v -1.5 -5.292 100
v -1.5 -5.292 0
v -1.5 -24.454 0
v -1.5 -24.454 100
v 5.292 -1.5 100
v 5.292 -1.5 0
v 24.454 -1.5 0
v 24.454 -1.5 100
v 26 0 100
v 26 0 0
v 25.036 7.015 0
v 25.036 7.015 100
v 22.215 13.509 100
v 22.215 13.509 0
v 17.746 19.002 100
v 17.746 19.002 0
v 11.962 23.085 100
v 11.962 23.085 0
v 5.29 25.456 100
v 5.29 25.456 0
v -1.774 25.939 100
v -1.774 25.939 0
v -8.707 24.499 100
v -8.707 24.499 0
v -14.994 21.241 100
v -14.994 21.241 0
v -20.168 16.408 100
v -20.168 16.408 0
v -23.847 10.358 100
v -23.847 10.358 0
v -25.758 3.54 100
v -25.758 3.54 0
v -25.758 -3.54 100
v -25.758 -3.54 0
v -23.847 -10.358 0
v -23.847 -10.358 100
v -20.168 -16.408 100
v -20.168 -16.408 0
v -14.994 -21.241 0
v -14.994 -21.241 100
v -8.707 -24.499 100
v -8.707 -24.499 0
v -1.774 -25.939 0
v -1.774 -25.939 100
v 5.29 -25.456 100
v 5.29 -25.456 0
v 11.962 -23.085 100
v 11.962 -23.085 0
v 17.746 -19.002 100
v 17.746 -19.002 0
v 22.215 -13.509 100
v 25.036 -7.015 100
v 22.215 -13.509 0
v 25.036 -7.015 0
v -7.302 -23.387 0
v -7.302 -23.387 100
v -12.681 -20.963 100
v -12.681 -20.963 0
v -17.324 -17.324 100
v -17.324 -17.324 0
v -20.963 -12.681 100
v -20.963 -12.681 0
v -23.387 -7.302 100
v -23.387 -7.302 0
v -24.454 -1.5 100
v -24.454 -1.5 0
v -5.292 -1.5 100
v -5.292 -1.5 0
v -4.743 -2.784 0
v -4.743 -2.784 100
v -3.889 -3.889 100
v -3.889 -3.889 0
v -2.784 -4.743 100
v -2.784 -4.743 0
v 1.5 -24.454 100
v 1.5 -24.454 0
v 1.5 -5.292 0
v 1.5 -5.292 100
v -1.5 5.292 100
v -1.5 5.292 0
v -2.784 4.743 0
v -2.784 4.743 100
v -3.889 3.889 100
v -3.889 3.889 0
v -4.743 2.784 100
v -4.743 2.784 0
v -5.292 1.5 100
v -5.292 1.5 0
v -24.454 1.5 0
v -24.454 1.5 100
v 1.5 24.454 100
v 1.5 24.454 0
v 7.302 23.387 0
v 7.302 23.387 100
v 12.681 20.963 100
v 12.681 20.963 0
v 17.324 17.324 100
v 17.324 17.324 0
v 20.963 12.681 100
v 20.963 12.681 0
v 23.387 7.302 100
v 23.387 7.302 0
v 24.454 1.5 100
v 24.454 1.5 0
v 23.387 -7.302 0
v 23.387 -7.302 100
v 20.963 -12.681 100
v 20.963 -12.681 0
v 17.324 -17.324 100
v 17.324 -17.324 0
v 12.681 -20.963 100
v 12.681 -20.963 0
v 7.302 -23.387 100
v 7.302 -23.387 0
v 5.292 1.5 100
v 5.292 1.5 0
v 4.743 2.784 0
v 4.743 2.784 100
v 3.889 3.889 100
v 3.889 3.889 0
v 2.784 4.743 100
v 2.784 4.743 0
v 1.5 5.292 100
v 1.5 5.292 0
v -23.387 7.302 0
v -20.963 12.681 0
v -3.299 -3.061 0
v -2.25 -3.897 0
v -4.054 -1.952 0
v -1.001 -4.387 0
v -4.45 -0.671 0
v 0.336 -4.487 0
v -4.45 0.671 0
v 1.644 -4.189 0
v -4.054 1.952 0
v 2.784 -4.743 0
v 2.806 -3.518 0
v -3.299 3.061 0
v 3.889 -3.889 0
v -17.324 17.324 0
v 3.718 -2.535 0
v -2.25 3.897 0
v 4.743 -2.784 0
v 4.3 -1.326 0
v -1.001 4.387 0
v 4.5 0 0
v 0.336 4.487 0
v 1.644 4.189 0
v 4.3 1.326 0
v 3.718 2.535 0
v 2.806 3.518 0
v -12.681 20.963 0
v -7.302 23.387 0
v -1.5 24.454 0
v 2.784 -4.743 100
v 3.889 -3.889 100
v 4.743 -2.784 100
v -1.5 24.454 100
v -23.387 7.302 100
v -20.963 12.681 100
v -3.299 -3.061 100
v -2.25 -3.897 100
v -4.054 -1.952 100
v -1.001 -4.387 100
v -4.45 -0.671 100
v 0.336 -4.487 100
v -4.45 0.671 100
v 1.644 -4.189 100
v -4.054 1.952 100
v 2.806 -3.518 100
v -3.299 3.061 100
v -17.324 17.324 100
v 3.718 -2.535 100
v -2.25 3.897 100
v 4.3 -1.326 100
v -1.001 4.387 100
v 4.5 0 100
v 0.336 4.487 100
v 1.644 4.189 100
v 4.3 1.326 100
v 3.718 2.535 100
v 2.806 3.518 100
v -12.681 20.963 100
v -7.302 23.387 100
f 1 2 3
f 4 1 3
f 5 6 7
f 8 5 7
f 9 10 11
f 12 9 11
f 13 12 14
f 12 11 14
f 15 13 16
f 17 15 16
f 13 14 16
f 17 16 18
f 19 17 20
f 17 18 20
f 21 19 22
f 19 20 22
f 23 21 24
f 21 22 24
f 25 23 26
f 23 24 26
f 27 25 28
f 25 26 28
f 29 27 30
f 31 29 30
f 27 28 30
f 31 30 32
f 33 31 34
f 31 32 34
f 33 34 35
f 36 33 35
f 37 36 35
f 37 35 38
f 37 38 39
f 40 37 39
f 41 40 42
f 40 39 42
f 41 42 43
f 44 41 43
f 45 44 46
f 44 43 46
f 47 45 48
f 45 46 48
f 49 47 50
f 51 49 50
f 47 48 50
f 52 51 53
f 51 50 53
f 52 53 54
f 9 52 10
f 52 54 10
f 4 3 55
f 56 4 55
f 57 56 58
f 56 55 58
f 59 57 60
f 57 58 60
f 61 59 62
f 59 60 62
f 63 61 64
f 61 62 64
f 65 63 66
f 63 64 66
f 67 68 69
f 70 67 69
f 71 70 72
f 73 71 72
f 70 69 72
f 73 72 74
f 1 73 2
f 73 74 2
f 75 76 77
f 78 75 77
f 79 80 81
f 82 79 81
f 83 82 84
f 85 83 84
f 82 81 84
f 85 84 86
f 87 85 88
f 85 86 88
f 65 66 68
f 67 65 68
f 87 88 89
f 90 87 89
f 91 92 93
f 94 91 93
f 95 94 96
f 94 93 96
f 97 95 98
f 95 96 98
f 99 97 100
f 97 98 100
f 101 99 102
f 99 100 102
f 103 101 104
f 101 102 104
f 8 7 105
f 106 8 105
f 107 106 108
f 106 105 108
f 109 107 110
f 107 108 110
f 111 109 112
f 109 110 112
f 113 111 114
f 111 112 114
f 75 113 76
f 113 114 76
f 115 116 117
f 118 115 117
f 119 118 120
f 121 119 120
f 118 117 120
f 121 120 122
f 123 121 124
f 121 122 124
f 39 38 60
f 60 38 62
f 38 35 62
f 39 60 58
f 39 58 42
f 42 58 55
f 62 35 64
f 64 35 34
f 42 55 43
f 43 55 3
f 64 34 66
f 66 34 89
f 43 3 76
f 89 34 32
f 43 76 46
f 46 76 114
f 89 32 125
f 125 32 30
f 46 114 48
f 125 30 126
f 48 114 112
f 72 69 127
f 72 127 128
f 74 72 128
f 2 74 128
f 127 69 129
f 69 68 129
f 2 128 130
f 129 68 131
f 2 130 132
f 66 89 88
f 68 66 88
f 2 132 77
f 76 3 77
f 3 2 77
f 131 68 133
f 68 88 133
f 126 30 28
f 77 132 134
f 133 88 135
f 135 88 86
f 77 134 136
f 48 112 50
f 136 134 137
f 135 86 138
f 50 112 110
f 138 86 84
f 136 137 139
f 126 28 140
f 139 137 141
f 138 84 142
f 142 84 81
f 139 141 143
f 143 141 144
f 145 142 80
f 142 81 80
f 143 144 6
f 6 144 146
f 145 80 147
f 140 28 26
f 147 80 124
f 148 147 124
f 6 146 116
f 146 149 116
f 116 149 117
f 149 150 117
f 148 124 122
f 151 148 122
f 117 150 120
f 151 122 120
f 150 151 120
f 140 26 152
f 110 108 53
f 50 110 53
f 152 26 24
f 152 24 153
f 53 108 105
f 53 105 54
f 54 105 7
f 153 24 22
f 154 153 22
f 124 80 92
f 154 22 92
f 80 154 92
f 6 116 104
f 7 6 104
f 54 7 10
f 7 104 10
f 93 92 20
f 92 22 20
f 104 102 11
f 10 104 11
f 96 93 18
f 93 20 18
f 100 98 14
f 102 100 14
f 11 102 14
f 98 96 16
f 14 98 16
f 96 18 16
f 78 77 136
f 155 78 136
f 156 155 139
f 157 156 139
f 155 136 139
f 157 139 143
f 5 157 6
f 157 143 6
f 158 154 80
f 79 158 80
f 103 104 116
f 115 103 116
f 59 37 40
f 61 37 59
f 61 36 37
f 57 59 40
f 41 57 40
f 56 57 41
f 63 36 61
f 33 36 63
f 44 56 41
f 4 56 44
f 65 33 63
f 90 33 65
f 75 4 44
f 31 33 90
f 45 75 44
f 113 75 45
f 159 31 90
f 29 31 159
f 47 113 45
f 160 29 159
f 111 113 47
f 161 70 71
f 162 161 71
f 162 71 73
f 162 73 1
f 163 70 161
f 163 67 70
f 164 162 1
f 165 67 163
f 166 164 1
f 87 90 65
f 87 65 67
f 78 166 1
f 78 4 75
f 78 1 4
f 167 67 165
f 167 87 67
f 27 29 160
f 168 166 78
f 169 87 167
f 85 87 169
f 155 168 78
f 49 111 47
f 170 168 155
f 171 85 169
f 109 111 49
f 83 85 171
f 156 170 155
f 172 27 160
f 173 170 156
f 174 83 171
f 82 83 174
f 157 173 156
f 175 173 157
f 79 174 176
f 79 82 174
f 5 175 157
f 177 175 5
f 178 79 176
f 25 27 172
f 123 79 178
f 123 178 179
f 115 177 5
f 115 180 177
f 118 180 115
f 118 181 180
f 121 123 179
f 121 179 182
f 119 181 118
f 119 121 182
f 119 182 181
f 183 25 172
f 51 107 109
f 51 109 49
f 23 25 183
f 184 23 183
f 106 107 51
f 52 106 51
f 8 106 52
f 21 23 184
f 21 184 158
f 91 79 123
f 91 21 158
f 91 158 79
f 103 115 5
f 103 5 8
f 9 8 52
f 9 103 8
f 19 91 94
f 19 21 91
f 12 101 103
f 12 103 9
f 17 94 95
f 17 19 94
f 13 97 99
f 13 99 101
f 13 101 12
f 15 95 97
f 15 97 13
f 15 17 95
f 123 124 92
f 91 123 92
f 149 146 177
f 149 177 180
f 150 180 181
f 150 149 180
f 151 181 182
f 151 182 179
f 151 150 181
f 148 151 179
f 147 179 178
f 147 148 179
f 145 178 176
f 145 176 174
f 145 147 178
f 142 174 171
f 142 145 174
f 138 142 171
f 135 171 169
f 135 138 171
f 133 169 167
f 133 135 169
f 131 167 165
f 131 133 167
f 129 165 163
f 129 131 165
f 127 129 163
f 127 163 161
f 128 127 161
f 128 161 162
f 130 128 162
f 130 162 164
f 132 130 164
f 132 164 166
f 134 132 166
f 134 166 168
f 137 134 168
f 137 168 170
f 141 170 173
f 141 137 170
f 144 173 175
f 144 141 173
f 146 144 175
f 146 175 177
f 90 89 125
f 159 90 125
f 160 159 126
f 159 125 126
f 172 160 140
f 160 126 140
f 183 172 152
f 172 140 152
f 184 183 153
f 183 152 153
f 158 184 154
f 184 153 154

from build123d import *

# Parameters (mm, degrees)
F0_R     = 26
F0_R_2   = 4.5
F1_DEPTH = 100


with BuildPart() as f1:
    # F0 (on Top) → F1 (new body)
    with BuildSketch(Plane.XY):
        Circle(F0_R)
        with BuildLine():
            ThreePointArc((24.454039, 1.5), (24.488507, 0.750352), (24.5, 0))
            ThreePointArc((24.5, 0), (24.488507, -0.750352), (24.454039, -1.5))
            ThreePointArc((24.454039, -1.5), (17.324116, -17.324116), (1.5, -24.454039))
            ThreePointArc((1.5, -24.454039), (0.750352, -24.488507), (0, -24.5))
            ThreePointArc((0, -24.5), (-0.750352, -24.488507), (-1.5, -24.454039))
            ThreePointArc((-1.5, -24.454039), (-17.324116, -17.324116), (-24.454039, -1.5))
            ThreePointArc((-24.454039, -1.5), (-24.488507, -0.750352), (-24.5, 0))
            ThreePointArc((-24.5, 0), (-24.488507, 0.750352), (-24.454039, 1.5))
            ThreePointArc((-24.454039, 1.5), (-17.324116, 17.324116), (-1.5, 24.454039))
            ThreePointArc((-1.5, 24.454039), (-0.750352, 24.488507), (0, 24.5))
            ThreePointArc((0, 24.5), (0.750352, 24.488507), (1.5, 24.454039))
            ThreePointArc((1.5, 24.454039), (17.324116, 17.324116), (24.454039, 1.5))
        make_face(mode=Mode.SUBTRACT)
        with BuildLine():
            Line((0, 5.5), (0, 24.5))
            ThreePointArc((0, 24.5), (-0.750352, 24.488507), (-1.5, 24.454039))
            Line((-1.5, 24.454039), (-1.5, 5.291503))
            ThreePointArc((-1.5, 5.291503), (-0.757211, 5.447626), (0, 5.5))
        make_face()
        with BuildLine():
            Line((1.5, 5.291503), (1.5, 24.454039))
            ThreePointArc((1.5, 24.454039), (0.750352, 24.488507), (0, 24.5))
            Line((0, 24.5), (0, 5.5))
            ThreePointArc((0, 5.5), (0.757211, 5.447626), (1.5, 5.291503))
        make_face()
        with BuildLine():
            ThreePointArc((5.291503, -1.5), (5.447626, -0.757211), (5.5, 0))
            ThreePointArc((5.5, 0), (5.447626, 0.757211), (5.291503, 1.5))
            ThreePointArc((5.291503, 1.5), (3.889087, 3.889087), (1.5, 5.291503))
            ThreePointArc((1.5, 5.291503), (0.757211, 5.447626), (0, 5.5))
            ThreePointArc((0, 5.5), (-0.757211, 5.447626), (-1.5, 5.291503))
            ThreePointArc((-1.5, 5.291503), (-3.889087, 3.889087), (-5.291503, 1.5))
            ThreePointArc((-5.291503, 1.5), (-5.447626, 0.757211), (-5.5, 0))
            ThreePointArc((-5.5, 0), (-5.447626, -0.757211), (-5.291503, -1.5))
            ThreePointArc((-5.291503, -1.5), (-3.889087, -3.889087), (-1.5, -5.291503))
            ThreePointArc((-1.5, -5.291503), (-0.757211, -5.447626), (0, -5.5))
            ThreePointArc((0, -5.5), (0.757211, -5.447626), (1.5, -5.291503))
            ThreePointArc((1.5, -5.291503), (3.889087, -3.889087), (5.291503, -1.5))
        make_face()
        Circle(F0_R_2, mode=Mode.SUBTRACT)
        with BuildLine():
            Line((5.5, 0), (24.5, 0))
            ThreePointArc((24.5, 0), (24.488507, 0.750352), (24.454039, 1.5))
            Line((24.454039, 1.5), (5.291503, 1.5))
            ThreePointArc((5.291503, 1.5), (5.447626, 0.757211), (5.5, 0))
        make_face()
        with BuildLine():
            ThreePointArc((24.454039, -1.5), (24.488507, -0.750352), (24.5, 0))
            Line((24.5, 0), (5.5, 0))
            ThreePointArc((5.5, 0), (5.447626, -0.757211), (5.291503, -1.5))
            Line((5.291503, -1.5), (24.454039, -1.5))
        make_face()
        with BuildLine():
            ThreePointArc((-1.5, -24.454039), (-0.750352, -24.488507), (0, -24.5))
            Line((0, -24.5), (0, -5.5))
            ThreePointArc((0, -5.5), (-0.757211, -5.447626), (-1.5, -5.291503))
            Line((-1.5, -5.291503), (-1.5, -24.454039))
        make_face()
        with BuildLine():
            Line((-5.291503, 1.5), (-24.454039, 1.5))
            ThreePointArc((-24.454039, 1.5), (-24.488507, 0.750352), (-24.5, 0))
            Line((-24.5, 0), (-5.5, 0))
            ThreePointArc((-5.5, 0), (-5.447626, 0.757211), (-5.291503, 1.5))
        make_face()
        with BuildLine():
            ThreePointArc((-24.5, 0), (-24.488507, -0.750352), (-24.454039, -1.5))
            Line((-24.454039, -1.5), (-5.291503, -1.5))
            ThreePointArc((-5.291503, -1.5), (-5.447626, -0.757211), (-5.5, 0))
            Line((-5.5, 0), (-24.5, 0))
        make_face()
        with BuildLine():
            ThreePointArc((0, -24.5), (0.750352, -24.488507), (1.5, -24.454039))
            Line((1.5, -24.454039), (1.5, -5.291503))
            ThreePointArc((1.5, -5.291503), (0.757211, -5.447626), (0, -5.5))
            Line((0, -5.5), (0, -24.5))
        make_face()
    extrude(amount=F1_DEPTH)


solid = f1.part
